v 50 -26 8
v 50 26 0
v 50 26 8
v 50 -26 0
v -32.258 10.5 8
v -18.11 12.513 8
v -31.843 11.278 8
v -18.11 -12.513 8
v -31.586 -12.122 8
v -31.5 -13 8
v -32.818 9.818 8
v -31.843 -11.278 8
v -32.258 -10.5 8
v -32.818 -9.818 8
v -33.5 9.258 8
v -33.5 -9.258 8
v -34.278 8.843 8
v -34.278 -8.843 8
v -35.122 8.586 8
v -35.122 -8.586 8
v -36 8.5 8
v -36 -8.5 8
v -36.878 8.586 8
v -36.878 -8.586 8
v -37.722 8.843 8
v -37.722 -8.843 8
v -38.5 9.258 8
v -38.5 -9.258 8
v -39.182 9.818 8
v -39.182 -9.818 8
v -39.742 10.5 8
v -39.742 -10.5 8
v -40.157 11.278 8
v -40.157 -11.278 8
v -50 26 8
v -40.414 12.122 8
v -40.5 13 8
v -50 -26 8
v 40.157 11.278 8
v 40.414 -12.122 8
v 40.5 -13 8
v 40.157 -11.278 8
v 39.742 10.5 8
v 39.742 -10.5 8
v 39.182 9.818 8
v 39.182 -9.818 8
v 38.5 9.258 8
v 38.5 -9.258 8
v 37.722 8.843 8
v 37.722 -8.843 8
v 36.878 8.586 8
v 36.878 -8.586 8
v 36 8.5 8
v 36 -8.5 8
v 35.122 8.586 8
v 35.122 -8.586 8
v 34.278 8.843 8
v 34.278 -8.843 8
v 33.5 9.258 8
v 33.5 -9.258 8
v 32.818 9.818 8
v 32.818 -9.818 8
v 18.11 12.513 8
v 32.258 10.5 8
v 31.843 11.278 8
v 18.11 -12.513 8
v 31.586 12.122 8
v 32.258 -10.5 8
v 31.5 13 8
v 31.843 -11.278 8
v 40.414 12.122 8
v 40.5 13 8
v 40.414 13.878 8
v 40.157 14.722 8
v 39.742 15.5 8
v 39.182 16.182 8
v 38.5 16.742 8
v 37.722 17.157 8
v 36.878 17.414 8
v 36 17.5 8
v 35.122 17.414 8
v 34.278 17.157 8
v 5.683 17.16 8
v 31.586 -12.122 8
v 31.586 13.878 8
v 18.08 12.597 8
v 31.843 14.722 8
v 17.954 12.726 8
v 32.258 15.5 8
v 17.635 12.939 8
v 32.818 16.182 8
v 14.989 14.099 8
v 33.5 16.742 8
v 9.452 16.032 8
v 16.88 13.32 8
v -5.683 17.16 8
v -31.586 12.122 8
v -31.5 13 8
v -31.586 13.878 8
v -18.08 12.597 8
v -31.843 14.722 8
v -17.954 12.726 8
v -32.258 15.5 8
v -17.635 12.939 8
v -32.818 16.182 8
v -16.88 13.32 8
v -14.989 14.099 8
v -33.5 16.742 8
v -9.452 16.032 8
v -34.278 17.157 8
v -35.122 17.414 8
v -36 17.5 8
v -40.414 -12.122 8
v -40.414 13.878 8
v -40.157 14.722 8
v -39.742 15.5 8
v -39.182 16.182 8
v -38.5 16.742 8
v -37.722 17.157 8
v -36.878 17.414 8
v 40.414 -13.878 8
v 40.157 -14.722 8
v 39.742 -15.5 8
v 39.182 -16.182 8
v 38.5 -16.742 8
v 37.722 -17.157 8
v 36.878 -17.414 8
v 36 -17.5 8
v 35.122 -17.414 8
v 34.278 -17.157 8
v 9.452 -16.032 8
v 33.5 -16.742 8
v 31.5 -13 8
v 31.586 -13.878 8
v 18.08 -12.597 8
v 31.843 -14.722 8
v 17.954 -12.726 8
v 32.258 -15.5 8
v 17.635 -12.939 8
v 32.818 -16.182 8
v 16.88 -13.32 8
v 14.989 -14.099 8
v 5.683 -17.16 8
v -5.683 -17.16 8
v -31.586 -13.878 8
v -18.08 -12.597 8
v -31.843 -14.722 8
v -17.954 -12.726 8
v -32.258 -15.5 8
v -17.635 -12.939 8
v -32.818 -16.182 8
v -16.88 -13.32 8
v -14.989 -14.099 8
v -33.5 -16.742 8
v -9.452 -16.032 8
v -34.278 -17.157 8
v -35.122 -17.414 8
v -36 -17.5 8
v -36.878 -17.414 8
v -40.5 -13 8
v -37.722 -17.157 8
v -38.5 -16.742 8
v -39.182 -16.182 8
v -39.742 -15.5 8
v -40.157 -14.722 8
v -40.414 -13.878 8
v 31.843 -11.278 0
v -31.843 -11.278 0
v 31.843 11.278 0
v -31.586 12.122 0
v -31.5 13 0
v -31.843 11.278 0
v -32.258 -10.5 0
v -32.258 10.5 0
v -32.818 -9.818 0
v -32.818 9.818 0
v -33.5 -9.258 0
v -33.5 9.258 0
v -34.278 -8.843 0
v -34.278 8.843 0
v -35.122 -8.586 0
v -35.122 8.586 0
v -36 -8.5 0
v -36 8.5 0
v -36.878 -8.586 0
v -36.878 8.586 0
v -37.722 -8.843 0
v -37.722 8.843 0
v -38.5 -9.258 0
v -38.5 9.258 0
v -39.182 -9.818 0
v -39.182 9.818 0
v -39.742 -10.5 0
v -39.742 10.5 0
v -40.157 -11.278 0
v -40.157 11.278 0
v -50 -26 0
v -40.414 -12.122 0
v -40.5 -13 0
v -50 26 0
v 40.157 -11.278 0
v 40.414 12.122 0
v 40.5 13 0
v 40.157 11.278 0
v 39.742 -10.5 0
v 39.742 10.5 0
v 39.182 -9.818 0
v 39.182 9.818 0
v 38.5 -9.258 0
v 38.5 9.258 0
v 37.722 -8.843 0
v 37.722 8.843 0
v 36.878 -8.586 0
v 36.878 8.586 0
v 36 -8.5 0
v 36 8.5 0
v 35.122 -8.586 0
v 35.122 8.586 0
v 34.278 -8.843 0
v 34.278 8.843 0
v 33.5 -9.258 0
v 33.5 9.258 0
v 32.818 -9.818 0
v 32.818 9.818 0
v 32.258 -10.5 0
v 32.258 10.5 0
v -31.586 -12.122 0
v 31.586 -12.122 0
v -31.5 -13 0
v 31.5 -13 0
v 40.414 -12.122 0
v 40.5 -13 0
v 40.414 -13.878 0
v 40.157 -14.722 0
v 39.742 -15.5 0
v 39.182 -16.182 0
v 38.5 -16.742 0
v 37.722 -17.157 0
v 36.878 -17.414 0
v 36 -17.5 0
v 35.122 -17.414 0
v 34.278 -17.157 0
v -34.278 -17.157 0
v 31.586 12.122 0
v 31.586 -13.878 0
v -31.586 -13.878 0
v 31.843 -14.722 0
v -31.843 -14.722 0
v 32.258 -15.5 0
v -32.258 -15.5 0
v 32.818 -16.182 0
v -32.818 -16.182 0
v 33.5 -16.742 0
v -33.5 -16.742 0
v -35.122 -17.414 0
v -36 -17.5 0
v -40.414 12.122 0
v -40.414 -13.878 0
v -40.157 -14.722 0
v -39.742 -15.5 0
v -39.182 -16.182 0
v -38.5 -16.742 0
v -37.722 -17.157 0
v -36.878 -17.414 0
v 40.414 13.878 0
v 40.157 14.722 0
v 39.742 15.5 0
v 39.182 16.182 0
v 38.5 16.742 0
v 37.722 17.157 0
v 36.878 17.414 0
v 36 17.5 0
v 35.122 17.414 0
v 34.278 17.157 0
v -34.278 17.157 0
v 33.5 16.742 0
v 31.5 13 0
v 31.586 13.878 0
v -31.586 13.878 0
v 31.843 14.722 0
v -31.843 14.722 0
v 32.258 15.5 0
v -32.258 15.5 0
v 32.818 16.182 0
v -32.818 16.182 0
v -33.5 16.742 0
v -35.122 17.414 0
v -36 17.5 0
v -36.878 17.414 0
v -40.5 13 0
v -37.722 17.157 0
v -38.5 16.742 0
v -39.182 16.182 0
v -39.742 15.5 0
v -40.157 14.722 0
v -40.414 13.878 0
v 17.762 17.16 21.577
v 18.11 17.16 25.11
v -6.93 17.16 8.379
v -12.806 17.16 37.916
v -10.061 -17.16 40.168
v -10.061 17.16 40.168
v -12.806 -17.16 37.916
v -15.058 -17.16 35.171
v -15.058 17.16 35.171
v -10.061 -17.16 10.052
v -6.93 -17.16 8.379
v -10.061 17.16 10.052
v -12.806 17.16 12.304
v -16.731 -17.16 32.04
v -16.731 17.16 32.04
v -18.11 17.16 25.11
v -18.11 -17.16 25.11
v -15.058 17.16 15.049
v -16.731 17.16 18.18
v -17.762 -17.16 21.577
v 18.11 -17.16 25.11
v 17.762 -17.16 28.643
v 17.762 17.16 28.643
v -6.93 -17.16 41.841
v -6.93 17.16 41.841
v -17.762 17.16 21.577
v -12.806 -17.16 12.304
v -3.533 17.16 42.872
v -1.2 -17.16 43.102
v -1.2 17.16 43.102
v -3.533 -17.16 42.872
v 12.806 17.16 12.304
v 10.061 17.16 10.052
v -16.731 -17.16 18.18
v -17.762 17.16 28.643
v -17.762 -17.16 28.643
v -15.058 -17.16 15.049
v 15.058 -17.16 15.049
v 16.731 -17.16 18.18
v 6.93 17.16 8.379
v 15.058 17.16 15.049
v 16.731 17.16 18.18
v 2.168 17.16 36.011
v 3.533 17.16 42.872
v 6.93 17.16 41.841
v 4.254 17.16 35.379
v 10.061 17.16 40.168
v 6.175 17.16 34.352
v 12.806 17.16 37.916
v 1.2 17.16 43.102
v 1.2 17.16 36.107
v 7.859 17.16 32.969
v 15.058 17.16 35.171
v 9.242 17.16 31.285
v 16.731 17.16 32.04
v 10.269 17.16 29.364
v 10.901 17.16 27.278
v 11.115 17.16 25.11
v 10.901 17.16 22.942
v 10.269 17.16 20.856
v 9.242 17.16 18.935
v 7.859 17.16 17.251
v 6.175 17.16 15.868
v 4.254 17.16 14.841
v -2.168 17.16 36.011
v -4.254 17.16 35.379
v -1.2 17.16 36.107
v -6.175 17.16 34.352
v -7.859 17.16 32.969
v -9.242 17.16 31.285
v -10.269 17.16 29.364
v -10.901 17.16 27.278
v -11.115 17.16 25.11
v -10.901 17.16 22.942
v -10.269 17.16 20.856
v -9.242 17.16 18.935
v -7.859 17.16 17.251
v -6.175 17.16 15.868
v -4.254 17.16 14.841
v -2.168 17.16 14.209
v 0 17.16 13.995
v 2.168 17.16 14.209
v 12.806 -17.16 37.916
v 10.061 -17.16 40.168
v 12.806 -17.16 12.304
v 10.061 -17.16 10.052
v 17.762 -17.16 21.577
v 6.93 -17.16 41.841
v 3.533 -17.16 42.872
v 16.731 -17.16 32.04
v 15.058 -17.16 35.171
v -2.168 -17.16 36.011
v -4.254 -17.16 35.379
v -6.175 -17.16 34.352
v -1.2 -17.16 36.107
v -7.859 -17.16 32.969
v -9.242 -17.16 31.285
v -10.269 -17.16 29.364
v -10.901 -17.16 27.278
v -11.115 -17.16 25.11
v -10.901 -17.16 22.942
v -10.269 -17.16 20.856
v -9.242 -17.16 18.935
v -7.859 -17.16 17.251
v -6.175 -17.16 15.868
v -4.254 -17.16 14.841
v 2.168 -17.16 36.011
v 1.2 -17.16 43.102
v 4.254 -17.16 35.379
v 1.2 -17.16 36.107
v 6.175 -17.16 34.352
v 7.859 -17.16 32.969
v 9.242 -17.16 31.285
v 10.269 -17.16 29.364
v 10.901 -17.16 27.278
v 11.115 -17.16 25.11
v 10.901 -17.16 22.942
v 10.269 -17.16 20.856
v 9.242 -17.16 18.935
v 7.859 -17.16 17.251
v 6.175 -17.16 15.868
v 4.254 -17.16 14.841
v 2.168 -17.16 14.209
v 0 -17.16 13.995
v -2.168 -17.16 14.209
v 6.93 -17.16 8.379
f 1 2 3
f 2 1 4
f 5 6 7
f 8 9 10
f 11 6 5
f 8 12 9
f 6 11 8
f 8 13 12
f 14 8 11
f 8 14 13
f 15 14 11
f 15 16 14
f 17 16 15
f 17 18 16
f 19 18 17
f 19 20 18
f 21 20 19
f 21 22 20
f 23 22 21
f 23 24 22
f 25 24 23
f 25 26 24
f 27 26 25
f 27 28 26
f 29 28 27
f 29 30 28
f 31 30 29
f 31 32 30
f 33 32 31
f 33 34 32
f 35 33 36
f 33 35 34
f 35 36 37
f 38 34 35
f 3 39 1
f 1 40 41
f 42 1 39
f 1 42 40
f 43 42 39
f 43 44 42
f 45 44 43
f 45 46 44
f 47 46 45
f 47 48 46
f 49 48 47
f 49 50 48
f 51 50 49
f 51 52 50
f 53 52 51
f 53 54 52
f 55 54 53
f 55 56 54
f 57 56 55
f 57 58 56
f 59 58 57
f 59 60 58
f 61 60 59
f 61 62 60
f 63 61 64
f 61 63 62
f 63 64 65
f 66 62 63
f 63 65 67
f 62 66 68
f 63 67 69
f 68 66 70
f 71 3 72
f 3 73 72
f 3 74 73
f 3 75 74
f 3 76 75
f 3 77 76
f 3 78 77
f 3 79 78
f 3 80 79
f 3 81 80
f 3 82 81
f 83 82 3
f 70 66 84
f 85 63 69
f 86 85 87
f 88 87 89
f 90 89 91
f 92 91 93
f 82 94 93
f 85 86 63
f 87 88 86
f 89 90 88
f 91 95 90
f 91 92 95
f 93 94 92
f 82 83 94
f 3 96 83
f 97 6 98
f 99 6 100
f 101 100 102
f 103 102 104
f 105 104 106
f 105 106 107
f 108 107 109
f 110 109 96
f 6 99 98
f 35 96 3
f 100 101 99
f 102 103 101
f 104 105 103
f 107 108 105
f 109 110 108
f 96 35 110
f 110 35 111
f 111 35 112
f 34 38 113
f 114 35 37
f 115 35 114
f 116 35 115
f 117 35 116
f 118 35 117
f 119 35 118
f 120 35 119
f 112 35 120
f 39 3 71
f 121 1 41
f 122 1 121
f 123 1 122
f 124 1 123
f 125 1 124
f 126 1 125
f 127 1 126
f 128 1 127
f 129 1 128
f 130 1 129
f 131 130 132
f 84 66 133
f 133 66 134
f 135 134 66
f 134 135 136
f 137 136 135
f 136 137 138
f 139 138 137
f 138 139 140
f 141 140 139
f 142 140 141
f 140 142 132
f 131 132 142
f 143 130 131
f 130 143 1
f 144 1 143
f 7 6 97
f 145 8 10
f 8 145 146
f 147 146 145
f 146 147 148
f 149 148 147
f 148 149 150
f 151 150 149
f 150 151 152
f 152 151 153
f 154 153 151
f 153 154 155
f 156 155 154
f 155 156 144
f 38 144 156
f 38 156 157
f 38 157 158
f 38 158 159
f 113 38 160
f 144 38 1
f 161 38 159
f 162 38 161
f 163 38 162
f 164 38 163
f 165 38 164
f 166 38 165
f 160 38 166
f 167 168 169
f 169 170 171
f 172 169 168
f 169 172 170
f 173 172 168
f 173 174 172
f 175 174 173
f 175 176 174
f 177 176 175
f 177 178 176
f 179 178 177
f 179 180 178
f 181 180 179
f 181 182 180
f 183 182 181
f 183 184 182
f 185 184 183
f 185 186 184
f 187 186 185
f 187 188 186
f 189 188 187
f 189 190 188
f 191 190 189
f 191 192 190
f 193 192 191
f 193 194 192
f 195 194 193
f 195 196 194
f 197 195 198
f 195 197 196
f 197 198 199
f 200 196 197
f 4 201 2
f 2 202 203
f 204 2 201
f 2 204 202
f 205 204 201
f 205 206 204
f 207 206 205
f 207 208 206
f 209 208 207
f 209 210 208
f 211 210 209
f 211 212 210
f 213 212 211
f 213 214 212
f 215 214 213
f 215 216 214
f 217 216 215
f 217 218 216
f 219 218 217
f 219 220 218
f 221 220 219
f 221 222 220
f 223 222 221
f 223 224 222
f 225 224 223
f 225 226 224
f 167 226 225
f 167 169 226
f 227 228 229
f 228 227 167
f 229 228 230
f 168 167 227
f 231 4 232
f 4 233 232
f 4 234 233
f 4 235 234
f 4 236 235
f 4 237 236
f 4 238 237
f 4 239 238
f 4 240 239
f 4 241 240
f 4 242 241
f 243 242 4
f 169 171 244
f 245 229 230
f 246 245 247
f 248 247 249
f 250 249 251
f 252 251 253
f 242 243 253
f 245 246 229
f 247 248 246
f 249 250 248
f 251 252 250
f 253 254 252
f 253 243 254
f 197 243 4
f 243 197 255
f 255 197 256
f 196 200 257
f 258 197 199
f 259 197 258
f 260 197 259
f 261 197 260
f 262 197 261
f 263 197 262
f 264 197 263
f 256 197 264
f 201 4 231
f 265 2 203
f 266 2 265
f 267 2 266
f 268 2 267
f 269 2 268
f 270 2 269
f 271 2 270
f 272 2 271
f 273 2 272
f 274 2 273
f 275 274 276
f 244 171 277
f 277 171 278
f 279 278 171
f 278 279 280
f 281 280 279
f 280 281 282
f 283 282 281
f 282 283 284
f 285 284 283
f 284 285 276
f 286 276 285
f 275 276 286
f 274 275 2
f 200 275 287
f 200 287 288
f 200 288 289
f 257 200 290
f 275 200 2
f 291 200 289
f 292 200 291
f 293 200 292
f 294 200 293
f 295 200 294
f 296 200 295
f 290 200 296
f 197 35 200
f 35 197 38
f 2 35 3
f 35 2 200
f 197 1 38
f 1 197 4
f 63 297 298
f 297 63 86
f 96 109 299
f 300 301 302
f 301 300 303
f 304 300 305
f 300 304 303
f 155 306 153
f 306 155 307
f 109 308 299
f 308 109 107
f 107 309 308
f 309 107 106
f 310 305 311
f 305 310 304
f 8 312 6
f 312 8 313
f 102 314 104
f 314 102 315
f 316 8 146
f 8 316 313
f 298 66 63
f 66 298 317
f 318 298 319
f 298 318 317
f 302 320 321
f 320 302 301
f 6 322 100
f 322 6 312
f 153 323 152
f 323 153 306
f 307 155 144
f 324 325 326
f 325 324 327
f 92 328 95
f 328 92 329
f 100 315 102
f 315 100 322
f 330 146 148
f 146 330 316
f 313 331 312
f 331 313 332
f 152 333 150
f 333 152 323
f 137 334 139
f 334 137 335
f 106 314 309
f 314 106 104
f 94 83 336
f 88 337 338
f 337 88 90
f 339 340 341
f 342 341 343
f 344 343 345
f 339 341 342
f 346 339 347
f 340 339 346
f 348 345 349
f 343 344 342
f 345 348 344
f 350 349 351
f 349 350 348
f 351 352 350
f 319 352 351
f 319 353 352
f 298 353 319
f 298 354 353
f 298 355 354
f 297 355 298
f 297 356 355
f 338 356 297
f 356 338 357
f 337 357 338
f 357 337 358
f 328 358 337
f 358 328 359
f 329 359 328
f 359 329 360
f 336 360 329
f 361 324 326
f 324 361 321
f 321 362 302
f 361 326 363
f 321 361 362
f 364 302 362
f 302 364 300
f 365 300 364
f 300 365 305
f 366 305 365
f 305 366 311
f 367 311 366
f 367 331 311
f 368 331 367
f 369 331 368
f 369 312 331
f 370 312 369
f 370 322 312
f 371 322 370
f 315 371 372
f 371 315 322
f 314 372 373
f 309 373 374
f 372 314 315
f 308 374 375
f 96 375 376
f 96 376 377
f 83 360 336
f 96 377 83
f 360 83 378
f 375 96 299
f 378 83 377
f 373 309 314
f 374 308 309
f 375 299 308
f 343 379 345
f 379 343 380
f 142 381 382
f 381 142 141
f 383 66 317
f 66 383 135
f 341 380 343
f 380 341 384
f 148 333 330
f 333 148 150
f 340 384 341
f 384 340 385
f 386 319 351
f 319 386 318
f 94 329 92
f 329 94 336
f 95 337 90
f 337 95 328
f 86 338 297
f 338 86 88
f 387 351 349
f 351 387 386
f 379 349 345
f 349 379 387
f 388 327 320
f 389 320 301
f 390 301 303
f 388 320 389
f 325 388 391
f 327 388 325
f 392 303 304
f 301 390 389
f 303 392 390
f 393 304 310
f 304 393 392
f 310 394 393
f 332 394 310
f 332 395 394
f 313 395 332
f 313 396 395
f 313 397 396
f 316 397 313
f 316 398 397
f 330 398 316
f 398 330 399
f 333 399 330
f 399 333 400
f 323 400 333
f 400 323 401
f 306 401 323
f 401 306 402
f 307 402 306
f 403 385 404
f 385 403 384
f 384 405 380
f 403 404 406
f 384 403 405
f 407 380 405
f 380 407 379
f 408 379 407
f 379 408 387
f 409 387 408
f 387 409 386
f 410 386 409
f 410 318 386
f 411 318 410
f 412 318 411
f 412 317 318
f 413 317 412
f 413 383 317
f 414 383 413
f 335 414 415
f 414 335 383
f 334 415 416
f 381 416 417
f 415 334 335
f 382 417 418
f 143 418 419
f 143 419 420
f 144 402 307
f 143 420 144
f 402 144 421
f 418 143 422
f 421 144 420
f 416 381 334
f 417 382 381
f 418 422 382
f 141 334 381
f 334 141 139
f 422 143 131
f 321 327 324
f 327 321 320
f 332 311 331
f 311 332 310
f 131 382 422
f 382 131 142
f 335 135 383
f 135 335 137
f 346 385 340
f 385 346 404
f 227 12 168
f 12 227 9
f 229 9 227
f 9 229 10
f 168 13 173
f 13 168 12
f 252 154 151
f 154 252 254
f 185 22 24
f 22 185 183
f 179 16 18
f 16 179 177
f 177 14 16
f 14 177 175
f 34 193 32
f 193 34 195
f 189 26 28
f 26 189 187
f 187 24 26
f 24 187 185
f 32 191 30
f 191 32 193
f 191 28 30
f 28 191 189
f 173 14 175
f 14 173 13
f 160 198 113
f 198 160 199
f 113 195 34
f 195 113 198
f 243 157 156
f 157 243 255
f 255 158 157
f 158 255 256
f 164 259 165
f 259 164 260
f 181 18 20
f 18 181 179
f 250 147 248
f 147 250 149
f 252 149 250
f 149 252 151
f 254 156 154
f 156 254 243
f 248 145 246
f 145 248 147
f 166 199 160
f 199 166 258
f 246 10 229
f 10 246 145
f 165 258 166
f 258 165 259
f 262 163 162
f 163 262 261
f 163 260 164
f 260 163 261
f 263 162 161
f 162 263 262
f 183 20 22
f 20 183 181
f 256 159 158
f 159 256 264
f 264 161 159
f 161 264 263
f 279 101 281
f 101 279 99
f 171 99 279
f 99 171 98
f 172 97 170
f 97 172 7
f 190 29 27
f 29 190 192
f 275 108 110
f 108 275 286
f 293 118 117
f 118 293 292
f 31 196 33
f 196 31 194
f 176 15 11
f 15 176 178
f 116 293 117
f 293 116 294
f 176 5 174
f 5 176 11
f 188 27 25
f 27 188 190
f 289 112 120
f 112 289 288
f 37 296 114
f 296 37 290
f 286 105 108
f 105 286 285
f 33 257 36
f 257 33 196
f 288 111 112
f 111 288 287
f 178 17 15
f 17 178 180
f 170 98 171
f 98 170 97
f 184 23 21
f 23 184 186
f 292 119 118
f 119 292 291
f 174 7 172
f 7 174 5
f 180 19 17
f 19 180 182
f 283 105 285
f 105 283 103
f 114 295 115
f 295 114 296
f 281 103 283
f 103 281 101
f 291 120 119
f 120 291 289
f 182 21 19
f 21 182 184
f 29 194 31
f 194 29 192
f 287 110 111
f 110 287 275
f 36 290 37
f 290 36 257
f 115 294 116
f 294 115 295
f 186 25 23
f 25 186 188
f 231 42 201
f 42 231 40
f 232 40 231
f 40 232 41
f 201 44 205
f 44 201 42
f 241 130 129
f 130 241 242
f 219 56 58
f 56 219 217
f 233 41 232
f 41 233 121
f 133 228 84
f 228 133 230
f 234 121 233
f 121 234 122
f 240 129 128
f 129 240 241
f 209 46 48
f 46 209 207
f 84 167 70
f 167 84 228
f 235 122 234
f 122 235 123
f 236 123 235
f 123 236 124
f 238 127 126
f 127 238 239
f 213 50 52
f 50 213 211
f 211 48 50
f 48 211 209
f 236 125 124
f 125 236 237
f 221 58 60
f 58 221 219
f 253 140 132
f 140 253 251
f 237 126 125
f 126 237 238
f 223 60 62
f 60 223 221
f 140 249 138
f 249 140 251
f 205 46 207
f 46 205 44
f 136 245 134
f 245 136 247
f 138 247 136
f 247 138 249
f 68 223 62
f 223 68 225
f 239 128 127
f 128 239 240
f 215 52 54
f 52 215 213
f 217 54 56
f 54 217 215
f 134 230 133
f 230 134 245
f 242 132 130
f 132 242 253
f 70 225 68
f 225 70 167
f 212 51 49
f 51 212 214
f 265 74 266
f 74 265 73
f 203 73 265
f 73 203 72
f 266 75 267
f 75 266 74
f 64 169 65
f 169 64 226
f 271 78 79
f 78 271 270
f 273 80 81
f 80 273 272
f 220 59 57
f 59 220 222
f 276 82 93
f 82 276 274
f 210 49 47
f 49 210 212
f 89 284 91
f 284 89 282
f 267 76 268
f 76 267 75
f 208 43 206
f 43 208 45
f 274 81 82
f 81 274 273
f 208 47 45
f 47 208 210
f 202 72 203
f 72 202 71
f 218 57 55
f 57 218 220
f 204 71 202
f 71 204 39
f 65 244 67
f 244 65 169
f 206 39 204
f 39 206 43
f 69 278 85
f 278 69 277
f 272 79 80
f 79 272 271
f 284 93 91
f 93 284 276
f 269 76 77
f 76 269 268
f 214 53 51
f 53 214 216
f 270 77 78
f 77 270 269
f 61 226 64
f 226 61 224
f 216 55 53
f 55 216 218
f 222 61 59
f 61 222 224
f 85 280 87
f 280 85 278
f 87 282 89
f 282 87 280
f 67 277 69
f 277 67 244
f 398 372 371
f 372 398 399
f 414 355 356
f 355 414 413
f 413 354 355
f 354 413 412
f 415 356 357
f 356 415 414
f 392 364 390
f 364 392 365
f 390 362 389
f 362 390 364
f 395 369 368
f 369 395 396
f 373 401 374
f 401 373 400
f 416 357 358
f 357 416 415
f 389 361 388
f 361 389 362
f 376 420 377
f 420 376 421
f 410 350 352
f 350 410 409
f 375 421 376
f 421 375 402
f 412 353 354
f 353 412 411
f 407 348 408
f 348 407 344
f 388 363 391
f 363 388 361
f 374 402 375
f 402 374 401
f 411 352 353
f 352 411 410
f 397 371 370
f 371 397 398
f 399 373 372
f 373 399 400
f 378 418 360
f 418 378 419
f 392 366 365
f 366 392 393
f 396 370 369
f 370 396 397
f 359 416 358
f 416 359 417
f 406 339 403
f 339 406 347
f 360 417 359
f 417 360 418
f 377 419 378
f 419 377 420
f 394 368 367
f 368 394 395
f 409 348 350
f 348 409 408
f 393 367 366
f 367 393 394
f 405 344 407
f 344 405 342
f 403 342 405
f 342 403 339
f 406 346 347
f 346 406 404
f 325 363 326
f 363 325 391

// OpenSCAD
$fn = 32;

// ----------------------------------------------------------------------
// Bearing block: 100 x 52 mm base, 22.23 mm bore at 25.11 mm
// ----------------------------------------------------------------------

// --- parameters (mm) ---
base_w = 100;             // base width
base_d = 52;              // base depth
base_t = 8;               // base thickness
bore_d = 22.23;           // shaft / bearing bore
house_r = 18.11;          // housing outer radius
house_len = 34.32;        // housing length along the shaft
foot_w = 36.22;           // foot width under the housing
foot_len = 24.32;         // foot length along the shaft
axis_z = 25.11;           // bore axis height above the base
holes_d = 9;              // mounting holes
hole_x = 36;              // mounting hole spacing
groove_w = 2.4;           // oil groove width

difference() {
  union() {
    /* base plate with its underside on z = 0 */
    translate([0, 0, base_t / 2]) cube([base_w, base_d, base_t], center = true);
    /* hull foot: a straight web blending into the round housing */
    hull() {
      translate([0, 0, base_t - 0.5]) cube([foot_w, foot_len, 1.6], center = true);
      translate([0, 0, axis_z]) rotate([-90, 0, 0]) cylinder(h = house_len, d = 2 * house_r, center = true);
    }
  }
  /* bore through the housing, 2.5 mm clear on both sides */
  translate([0, 0, axis_z]) rotate([-90, 0, 0]) cylinder(h = house_len + 5, d = bore_d, center = true);
  /* oil groove from the top of the housing into the bore */
  translate([-groove_w / 2, -house_len / 2 - 2.5, axis_z + bore_d * 0.17]) cube([groove_w, house_len + 5, house_r + 5]);
  /* mounting holes through the base plate */
  for (hx = [-36, 36]) {
    for (hy = [-13, 13]) {
      translate([hx, hy, -2.5]) cylinder(h = base_t + 5, d = holes_d);
    }
  }
}
